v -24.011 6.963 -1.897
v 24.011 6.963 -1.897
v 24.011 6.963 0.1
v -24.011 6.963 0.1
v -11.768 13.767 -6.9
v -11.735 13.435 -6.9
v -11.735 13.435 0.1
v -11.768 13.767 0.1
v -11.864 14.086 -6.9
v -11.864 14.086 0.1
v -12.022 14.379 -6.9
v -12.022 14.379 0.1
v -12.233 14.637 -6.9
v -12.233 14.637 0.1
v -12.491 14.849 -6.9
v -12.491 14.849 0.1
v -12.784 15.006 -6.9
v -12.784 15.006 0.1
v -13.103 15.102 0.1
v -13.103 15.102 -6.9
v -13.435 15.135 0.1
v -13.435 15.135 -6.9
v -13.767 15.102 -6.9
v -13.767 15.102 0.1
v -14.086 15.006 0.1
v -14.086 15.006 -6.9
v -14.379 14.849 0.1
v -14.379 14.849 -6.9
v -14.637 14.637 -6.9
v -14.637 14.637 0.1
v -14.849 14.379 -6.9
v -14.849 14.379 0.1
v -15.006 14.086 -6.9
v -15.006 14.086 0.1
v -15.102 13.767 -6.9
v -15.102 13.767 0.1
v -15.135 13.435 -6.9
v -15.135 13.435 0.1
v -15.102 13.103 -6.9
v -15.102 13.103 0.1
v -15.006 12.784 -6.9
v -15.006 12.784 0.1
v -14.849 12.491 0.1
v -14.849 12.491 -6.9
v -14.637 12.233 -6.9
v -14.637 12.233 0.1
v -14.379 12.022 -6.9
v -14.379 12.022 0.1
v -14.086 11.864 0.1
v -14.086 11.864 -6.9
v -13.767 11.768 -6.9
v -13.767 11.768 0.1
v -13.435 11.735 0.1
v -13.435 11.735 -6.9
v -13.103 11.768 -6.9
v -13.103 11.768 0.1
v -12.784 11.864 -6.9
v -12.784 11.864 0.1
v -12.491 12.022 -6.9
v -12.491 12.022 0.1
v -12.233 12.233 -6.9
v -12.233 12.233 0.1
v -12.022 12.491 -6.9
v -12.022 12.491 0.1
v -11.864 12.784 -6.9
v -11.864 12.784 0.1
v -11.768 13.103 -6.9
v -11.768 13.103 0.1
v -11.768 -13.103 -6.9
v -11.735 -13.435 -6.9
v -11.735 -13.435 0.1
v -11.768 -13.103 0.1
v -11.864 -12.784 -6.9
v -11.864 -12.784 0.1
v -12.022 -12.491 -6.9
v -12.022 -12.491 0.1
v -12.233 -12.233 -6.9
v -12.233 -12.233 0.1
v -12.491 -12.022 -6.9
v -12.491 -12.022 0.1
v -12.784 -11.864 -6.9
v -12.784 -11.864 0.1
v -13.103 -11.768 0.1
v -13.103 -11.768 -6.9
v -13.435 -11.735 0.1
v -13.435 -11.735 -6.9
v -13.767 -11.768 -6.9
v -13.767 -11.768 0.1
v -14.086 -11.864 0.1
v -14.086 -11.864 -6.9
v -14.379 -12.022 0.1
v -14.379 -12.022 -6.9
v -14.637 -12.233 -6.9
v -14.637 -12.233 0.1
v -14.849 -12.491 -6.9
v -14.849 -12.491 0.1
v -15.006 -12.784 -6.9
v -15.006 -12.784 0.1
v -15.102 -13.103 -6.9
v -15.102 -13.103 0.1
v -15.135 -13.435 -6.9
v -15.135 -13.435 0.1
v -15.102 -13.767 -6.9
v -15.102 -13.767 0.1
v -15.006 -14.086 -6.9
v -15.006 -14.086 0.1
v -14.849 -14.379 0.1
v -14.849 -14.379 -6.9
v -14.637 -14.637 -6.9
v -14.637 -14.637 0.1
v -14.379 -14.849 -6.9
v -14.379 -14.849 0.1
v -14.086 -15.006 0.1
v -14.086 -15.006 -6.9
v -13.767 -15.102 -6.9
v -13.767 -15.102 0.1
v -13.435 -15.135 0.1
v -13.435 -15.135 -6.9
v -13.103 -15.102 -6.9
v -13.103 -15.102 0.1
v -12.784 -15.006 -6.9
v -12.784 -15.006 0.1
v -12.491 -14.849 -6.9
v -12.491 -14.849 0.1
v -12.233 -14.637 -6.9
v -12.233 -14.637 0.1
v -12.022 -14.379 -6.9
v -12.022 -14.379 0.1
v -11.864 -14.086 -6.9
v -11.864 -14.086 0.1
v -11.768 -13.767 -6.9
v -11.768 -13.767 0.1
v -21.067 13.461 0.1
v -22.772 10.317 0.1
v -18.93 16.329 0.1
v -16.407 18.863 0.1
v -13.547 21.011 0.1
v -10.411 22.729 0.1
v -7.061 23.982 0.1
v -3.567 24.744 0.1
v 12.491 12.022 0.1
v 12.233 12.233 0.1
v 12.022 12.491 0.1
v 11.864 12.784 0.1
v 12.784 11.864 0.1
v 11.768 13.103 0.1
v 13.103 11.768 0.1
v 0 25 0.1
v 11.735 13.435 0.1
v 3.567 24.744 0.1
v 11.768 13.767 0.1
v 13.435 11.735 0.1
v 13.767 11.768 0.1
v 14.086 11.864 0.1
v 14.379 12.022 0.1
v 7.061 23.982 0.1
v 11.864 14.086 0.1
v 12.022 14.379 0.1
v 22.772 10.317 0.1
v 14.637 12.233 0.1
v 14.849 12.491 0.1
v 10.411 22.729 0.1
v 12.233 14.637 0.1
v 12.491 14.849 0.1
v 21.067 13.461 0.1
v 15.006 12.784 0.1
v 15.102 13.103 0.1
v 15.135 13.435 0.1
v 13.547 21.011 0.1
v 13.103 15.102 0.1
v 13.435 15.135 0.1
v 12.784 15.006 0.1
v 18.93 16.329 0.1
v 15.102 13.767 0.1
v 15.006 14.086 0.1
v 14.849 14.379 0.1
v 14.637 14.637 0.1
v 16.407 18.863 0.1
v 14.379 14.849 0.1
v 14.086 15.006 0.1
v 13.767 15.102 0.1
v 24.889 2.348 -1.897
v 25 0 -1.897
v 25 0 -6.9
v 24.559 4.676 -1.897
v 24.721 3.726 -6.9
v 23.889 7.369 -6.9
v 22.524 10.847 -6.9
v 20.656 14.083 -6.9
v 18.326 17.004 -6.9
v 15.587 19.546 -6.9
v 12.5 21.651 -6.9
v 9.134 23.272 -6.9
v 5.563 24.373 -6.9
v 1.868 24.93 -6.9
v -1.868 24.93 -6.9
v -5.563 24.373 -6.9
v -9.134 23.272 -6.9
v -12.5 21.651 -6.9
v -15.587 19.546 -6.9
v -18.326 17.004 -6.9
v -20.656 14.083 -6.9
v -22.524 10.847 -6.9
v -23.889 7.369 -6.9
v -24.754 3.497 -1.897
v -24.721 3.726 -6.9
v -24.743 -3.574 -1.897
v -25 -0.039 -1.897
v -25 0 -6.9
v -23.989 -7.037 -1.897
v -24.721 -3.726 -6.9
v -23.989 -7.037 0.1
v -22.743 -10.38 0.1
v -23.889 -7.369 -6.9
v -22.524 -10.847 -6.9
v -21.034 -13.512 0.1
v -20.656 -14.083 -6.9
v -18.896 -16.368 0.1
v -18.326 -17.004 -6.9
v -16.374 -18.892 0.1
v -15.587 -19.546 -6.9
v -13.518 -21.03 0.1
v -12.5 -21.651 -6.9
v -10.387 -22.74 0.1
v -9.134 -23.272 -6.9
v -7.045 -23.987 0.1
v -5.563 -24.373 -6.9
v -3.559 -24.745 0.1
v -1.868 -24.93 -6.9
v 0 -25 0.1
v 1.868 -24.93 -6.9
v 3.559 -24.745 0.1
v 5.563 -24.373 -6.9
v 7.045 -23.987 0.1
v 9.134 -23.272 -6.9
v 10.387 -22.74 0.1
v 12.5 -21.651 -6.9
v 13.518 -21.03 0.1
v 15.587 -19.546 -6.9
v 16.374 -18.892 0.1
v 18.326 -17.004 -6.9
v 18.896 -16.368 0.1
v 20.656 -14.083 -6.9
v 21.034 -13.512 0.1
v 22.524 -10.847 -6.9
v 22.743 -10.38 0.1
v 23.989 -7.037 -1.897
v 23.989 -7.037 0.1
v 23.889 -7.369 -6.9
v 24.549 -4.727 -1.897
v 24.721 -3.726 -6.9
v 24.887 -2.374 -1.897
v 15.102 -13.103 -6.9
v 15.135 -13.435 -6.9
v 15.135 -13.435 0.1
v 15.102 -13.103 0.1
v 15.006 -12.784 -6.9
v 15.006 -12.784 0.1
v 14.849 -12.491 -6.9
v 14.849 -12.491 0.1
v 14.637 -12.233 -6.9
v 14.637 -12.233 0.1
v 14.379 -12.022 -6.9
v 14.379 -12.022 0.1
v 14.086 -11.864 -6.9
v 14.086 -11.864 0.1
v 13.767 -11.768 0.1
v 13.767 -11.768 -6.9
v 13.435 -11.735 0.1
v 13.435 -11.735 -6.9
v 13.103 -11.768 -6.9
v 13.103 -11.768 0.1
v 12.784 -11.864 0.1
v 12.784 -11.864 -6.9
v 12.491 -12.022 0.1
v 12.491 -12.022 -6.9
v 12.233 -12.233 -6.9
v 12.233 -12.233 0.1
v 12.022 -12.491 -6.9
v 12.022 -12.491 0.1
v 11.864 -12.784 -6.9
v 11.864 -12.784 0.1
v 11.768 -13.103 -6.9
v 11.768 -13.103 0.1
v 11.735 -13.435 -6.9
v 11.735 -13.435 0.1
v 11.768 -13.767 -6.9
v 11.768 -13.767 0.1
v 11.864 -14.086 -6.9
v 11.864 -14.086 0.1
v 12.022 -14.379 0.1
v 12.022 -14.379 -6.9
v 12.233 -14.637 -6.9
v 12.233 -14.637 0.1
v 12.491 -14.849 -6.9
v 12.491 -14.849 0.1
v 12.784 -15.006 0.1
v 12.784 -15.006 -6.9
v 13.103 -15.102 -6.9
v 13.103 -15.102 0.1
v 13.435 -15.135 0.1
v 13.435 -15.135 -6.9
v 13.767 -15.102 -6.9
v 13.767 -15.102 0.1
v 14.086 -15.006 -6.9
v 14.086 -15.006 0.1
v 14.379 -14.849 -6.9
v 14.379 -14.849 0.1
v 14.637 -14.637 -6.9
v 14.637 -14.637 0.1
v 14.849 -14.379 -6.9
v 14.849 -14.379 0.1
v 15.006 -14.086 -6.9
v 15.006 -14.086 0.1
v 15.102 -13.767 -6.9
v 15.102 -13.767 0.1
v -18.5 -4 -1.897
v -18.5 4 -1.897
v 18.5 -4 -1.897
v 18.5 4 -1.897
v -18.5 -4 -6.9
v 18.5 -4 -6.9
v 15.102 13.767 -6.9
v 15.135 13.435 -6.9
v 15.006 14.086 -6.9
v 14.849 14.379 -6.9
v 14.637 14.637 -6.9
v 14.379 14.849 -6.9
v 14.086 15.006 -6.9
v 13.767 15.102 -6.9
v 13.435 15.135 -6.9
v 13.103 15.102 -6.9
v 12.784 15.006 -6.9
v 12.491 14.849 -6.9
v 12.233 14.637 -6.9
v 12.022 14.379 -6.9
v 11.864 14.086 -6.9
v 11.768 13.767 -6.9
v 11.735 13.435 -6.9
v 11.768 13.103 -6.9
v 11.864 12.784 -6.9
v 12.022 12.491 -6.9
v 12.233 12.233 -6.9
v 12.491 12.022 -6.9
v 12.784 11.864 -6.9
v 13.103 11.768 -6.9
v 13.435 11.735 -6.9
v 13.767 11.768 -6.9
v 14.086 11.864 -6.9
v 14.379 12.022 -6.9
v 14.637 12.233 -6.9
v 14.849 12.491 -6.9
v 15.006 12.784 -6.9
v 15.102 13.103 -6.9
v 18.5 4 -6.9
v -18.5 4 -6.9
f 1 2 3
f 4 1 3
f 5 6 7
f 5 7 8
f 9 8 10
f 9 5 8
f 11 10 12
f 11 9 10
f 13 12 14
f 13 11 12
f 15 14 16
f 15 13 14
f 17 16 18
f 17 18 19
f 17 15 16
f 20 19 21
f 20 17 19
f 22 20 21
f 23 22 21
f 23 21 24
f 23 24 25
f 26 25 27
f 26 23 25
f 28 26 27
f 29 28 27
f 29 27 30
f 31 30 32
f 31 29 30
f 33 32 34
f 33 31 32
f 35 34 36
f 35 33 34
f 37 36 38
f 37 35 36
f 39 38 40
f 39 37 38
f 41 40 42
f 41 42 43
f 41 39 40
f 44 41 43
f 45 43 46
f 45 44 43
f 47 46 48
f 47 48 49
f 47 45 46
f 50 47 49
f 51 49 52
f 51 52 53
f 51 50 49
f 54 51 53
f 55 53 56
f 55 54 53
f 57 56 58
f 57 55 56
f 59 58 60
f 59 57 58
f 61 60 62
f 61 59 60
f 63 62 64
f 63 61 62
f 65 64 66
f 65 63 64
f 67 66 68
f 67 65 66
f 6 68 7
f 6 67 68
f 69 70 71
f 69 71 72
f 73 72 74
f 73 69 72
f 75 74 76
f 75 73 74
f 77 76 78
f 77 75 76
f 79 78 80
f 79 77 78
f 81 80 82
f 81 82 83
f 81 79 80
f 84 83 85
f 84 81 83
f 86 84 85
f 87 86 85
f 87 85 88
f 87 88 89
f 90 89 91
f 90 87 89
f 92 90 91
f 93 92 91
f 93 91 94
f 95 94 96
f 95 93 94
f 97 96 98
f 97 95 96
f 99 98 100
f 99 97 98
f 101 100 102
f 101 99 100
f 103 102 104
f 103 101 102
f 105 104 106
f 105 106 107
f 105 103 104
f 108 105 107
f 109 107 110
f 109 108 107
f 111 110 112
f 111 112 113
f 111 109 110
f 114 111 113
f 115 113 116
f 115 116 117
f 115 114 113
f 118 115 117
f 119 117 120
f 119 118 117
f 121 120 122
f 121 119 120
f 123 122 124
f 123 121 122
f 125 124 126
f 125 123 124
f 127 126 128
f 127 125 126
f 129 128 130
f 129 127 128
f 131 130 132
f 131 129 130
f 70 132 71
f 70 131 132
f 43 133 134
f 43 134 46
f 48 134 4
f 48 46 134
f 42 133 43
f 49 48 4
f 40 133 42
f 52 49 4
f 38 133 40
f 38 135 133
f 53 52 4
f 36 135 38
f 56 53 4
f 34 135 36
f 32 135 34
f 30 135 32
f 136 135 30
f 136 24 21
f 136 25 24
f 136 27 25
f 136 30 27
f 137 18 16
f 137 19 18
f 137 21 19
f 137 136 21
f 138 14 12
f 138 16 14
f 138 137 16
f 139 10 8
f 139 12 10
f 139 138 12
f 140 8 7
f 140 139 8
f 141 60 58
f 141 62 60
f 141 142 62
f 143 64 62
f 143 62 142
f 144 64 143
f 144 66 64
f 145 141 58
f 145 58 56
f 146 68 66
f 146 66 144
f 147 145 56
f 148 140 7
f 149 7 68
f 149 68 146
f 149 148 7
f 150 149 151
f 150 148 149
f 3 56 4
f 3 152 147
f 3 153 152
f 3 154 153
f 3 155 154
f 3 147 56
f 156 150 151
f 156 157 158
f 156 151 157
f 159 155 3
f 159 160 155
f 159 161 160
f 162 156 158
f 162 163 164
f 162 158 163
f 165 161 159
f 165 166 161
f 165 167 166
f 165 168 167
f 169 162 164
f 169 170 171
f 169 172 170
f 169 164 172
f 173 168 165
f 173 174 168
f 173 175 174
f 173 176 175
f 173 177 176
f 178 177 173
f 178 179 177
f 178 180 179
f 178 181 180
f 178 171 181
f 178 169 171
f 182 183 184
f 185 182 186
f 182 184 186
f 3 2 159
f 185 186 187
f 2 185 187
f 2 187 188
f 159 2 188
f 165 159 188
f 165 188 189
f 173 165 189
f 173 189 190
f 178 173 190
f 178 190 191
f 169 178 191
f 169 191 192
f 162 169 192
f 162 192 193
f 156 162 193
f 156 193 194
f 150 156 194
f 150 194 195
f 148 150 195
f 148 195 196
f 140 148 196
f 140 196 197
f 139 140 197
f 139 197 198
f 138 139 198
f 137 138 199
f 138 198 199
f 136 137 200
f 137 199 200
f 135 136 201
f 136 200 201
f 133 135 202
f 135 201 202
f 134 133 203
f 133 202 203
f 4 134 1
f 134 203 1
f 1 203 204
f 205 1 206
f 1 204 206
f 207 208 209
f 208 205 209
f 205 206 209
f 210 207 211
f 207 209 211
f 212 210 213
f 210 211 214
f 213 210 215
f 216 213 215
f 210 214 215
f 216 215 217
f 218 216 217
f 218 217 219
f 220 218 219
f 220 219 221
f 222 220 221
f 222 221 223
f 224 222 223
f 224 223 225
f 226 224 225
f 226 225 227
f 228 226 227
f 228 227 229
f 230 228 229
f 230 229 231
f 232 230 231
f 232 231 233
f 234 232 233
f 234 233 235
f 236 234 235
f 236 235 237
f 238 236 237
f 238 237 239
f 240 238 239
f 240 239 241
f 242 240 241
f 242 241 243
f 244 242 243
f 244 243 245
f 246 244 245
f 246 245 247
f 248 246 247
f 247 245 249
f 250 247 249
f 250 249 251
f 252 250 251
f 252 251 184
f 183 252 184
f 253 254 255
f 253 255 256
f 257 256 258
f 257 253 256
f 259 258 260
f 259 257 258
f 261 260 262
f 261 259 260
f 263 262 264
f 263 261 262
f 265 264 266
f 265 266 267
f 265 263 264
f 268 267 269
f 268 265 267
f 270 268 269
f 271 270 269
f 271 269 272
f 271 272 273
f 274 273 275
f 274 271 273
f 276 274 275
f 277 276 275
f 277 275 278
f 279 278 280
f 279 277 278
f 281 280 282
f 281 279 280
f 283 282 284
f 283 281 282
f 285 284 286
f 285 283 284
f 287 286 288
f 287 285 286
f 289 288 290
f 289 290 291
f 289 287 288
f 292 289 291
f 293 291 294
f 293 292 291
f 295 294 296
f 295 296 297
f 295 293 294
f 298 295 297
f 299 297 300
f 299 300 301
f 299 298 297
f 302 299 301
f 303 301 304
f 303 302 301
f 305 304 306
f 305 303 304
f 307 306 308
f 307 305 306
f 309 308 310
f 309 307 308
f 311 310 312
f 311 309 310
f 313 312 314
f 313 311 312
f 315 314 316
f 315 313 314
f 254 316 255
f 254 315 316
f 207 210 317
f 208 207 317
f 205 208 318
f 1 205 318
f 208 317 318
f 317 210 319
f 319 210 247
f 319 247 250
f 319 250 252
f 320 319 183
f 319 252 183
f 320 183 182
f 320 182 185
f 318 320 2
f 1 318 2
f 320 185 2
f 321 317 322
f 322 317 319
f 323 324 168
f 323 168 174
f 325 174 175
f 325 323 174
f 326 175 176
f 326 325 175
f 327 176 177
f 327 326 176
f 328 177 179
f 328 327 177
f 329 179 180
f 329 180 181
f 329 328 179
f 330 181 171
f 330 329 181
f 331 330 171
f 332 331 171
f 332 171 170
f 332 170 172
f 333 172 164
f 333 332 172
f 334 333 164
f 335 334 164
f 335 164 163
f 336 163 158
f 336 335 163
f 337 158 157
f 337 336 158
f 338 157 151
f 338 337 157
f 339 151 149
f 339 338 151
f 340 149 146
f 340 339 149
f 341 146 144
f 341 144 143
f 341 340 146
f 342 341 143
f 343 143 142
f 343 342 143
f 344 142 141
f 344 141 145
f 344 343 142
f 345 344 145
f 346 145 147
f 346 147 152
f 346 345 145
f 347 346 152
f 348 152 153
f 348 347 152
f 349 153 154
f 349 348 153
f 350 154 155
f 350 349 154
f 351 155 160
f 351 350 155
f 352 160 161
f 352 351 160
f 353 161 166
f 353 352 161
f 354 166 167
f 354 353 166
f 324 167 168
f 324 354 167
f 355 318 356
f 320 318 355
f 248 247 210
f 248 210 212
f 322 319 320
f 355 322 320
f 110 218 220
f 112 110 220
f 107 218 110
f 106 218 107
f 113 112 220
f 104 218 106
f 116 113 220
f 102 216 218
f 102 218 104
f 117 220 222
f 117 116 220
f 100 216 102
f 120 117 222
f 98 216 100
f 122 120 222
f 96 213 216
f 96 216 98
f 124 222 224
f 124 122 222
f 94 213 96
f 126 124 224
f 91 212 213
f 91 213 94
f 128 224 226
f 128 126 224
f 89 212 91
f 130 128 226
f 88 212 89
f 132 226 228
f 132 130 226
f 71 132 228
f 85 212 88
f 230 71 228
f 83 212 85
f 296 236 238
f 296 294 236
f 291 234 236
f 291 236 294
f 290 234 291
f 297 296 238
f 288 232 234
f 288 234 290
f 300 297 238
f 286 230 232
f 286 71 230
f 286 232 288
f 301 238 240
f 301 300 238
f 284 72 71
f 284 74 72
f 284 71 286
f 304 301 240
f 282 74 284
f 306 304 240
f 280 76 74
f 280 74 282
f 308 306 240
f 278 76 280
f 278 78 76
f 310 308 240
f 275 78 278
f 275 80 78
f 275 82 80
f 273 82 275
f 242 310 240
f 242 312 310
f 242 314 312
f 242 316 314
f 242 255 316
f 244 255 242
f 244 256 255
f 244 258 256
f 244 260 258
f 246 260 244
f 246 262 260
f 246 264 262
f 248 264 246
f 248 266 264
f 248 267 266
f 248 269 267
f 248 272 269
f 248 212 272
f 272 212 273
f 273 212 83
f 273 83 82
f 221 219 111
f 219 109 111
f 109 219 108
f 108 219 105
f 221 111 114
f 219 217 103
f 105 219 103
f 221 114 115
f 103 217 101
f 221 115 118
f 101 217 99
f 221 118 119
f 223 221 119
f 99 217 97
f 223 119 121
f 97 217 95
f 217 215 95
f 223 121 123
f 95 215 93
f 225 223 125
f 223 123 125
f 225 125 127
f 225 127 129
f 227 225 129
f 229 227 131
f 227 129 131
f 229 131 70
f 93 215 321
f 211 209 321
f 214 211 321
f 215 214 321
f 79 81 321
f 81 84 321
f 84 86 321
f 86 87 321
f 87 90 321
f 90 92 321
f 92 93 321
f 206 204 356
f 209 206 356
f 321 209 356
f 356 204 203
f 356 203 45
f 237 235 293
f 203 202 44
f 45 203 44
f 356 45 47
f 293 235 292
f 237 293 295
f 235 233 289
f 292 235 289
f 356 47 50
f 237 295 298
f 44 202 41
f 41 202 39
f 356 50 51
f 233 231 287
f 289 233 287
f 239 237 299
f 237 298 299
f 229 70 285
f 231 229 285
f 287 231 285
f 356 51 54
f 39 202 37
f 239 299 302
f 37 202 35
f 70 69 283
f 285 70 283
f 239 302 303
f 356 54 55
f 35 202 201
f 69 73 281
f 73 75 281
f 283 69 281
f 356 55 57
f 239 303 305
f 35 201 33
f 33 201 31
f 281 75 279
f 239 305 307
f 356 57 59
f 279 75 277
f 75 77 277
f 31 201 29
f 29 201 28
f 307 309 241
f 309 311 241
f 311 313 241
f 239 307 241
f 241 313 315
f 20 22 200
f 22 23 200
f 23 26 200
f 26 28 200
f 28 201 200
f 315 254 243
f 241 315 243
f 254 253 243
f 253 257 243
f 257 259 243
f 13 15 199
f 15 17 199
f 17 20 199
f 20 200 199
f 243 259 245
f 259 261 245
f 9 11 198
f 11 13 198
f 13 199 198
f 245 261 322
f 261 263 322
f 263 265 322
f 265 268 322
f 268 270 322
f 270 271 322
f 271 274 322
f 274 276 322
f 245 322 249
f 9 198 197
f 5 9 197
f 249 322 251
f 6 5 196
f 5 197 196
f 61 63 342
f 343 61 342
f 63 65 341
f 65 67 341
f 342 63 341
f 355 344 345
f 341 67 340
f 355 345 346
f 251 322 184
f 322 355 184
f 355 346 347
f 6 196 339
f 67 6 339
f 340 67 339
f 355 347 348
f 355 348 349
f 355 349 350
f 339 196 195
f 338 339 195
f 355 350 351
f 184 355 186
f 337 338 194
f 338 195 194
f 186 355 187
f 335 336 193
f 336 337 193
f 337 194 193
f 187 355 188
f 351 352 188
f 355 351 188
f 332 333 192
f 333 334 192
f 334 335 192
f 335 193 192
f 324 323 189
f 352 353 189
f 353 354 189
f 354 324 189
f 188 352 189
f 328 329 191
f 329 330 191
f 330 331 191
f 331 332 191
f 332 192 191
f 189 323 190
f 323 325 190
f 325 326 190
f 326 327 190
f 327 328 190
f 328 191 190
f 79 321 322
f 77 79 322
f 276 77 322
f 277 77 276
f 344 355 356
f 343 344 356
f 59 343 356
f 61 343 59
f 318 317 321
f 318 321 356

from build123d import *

# Parameters (mm, degrees)
BOSS_EXTRU_1_DEPTH           = 0.1
BOSS_EXTRU_1_DEPTH_BACK      = 6.9
ESQUISSE1_R                  = 25
ESQUISSE1_R_2                = 1.7
ESQUISSE2_W                  = 37
ESQUISSE2_H                  = 8
ENL_V_MAT_EXTRU_1_DEPTH      = 37.041642582
ENL_V_MAT_EXTRU_3_DEPTH      = 51.801015595
ENL_V_MAT_EXTRU_3_DEPTH_BACK = 51.801015595
ESQUISSE3_W                  = 2.84
ESQUISSE3_H                  = 14


with BuildPart() as part:
    # Esquisse1 → Boss.-Extru.1 (new, two sides: drawn at the far end of the back side and taken through both)
    with BuildSketch(Plane.XY.offset(-BOSS_EXTRU_1_DEPTH_BACK)):
        Circle(ESQUISSE1_R)
        with Locations((-13.435028843, 13.435028843)):
            Circle(ESQUISSE1_R_2, mode=Mode.SUBTRACT)
        with Locations((13.435028843, 13.435028843)):
            Circle(ESQUISSE1_R_2, mode=Mode.SUBTRACT)
        with Locations((13.435028843, -13.435028843)):
            Circle(ESQUISSE1_R_2, mode=Mode.SUBTRACT)
        with Locations((-13.435028843, -13.435028843)):
            Circle(ESQUISSE1_R_2, mode=Mode.SUBTRACT)
    extrude(amount=BOSS_EXTRU_1_DEPTH + BOSS_EXTRU_1_DEPTH_BACK)

    # Esquisse2 → Enlèv. mat.-Extru.1 (cut, through all)
    with BuildSketch(Plane.XY.offset(0.1)):
        Rectangle(ESQUISSE2_W, ESQUISSE2_H)
    extrude(amount=-ENL_V_MAT_EXTRU_1_DEPTH, mode=Mode.SUBTRACT)

    # Esquisse3 → Enlèv. mat.-Extru.3 (cut, two sides: drawn at the far end of the back side and taken through both)
    with BuildSketch(Plane(origin=(18.5, 0, 1.068261133), x_dir=(0, 0, 1), z_dir=(-1, 0, 0)).offset(-ENL_V_MAT_EXTRU_3_DEPTH_BACK)):
        with Locations((-1.545739837, -0.037482161)):
            Rectangle(ESQUISSE3_W, ESQUISSE3_H)
    extrude(amount=ENL_V_MAT_EXTRU_3_DEPTH + ENL_V_MAT_EXTRU_3_DEPTH_BACK, mode=Mode.SUBTRACT)


solid = part.part
